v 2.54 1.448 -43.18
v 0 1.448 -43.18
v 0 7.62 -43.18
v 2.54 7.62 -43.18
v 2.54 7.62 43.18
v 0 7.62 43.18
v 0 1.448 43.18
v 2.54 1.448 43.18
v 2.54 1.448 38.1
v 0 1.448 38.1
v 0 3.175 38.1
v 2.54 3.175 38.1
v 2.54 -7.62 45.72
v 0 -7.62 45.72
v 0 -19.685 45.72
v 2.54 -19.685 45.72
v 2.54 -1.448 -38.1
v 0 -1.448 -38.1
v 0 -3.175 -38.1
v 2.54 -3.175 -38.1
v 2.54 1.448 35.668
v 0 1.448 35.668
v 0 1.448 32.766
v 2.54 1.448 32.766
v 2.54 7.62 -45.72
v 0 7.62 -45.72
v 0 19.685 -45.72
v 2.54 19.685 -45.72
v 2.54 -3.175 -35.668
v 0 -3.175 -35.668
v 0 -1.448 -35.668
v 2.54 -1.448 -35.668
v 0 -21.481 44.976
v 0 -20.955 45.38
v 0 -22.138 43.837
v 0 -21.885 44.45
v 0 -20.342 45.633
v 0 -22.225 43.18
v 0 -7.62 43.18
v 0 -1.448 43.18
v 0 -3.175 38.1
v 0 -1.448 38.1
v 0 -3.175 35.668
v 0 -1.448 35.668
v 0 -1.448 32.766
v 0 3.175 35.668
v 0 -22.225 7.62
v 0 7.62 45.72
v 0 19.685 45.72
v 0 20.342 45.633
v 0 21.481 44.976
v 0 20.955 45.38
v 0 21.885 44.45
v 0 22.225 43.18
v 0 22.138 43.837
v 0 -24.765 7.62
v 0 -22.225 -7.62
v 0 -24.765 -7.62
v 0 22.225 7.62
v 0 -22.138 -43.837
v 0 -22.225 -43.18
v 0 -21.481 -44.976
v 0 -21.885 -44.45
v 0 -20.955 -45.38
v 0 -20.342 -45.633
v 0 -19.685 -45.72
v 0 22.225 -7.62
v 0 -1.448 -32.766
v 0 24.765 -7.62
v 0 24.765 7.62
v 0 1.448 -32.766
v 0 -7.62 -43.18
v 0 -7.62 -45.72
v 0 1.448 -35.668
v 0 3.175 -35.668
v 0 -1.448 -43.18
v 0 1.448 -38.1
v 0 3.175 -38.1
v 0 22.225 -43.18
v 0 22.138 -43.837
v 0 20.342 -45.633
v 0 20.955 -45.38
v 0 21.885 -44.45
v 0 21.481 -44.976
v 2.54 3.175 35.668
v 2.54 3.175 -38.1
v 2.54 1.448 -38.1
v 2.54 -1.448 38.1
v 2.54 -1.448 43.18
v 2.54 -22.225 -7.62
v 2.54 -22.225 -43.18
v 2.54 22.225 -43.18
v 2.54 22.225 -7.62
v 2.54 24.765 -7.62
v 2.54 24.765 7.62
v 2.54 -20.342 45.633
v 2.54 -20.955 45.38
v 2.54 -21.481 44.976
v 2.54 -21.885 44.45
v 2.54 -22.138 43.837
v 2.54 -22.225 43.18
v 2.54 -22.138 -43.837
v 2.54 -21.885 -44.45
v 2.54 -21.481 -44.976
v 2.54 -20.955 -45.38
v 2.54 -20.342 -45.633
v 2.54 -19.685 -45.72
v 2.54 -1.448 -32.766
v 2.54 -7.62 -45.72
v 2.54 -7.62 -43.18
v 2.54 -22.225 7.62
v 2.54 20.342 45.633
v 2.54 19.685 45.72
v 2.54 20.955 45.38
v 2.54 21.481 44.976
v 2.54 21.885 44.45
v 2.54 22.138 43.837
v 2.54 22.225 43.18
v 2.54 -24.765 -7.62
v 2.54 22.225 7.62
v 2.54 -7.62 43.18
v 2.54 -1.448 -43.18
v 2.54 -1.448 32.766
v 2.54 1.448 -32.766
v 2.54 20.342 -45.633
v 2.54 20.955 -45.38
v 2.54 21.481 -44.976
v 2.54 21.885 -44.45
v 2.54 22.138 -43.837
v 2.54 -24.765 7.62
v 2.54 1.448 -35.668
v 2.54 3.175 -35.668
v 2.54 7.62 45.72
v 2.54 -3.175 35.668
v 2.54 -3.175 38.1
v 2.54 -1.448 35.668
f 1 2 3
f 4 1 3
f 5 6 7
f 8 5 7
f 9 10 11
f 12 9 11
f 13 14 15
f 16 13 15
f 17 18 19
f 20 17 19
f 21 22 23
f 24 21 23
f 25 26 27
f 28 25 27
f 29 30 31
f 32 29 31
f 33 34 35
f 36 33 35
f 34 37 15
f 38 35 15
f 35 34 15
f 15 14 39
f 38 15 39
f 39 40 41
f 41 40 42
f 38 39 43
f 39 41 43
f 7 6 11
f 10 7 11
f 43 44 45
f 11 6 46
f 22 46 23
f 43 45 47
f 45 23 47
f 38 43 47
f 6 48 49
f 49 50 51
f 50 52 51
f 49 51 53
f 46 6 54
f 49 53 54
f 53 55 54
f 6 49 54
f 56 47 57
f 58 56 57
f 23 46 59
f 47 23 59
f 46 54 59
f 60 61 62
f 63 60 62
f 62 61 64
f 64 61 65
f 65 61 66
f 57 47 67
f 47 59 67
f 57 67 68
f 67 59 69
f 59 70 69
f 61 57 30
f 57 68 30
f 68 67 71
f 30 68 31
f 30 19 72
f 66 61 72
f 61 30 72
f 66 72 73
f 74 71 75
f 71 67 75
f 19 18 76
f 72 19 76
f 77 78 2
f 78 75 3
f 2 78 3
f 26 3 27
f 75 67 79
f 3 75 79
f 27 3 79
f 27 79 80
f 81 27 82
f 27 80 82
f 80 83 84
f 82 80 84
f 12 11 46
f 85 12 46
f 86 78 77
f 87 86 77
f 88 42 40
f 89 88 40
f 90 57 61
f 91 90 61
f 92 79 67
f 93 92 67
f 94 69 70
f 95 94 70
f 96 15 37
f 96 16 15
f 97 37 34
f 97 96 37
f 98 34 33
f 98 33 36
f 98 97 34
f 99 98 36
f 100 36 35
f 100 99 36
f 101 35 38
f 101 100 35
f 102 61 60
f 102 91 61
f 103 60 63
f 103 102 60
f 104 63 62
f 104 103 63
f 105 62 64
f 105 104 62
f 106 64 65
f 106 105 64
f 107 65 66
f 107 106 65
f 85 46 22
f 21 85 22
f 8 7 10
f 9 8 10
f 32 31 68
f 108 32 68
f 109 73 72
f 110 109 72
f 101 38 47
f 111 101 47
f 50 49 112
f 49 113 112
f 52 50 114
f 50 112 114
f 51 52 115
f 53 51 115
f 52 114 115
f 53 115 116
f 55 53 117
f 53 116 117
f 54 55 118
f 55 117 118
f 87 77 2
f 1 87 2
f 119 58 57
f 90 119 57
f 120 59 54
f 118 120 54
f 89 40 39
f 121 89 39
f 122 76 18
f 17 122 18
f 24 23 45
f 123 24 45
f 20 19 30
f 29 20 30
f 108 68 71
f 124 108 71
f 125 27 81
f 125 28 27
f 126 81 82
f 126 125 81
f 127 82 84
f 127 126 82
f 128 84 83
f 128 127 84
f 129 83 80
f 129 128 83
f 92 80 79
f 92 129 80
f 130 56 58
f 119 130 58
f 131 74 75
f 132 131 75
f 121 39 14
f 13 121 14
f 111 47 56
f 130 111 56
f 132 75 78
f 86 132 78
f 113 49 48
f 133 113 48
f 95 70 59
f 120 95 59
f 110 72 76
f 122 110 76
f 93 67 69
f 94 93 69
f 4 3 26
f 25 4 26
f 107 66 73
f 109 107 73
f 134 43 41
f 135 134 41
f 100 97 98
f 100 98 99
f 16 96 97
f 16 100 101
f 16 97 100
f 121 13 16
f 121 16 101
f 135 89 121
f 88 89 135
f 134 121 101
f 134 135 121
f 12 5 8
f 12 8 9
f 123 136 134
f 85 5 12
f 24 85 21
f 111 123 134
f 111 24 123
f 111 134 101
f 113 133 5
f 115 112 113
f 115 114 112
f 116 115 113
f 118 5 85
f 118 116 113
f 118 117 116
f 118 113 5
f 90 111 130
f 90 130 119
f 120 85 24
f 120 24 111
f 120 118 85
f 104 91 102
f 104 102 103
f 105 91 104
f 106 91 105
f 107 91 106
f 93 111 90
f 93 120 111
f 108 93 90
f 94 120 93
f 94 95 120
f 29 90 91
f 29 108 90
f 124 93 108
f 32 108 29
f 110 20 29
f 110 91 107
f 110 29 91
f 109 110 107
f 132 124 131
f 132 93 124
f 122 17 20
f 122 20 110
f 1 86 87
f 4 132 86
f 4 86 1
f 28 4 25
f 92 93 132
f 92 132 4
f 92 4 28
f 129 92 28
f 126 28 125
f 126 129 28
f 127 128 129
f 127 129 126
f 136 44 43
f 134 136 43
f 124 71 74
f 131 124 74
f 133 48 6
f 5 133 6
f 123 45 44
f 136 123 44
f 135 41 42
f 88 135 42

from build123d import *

# Parameters (mm, degrees)
BOSS_EXTRUDE1_DEPTH = 2.54
FILLET1_R           = 2.54


with BuildPart() as part:
    # Sketch2 → Boss-Extrude1 (new body)
    with BuildSketch(Plane(origin=(0, 0, 0), x_dir=(0, 0, -1), z_dir=(1, 0, 0))):
        Polygon((-45.72, 22.225), (-45.72, 7.62), (-43.18, 7.62), (-43.18, 1.4478), (-38.1, 1.4478), (-38.1, 3.175), (-35.66795, 3.175), (-35.66795, 1.4478), (-32.766, 1.4478), (-32.766, -1.4478), (-35.66795, -1.4478), (-35.66795, -3.175), (-38.1, -3.175), (-38.1, -1.4478), (-43.18, -1.4478), (-43.18, -7.62), (-45.72, -7.62), (-45.72, -22.225), (-7.62, -22.225), (-7.62, -24.765), (7.62, -24.765), (7.62, -22.225), (45.72, -22.225), (45.72, -7.62), (43.18, -7.62), (43.18, -1.4478), (38.1, -1.4478), (38.1, -3.175), (35.66795, -3.175), (35.66795, -1.4478), (32.766, -1.4478), (32.766, 1.4478), (35.66795, 1.4478), (35.66795, 3.175), (38.1, 3.175), (38.1, 1.4478), (43.18, 1.4478), (43.18, 7.62), (45.72, 7.62), (45.72, 22.225), (7.62, 22.225), (7.62, 24.765), (-7.62, 24.765), (-7.62, 22.225), align=None)
    extrude(amount=BOSS_EXTRUDE1_DEPTH)

    # Fillet1
    fillet1_edges = [part.edges().sort_by_distance(p)[0] for p in [
        (1.27, -22.225, -45.72),
        (1.27, -22.225, 45.72),
        (1.27, 22.225, 45.72),
        (1.27, 22.225, -45.72),
    ]]
    fillet(fillet1_edges, radius=FILLET1_R)


solid = part.part
